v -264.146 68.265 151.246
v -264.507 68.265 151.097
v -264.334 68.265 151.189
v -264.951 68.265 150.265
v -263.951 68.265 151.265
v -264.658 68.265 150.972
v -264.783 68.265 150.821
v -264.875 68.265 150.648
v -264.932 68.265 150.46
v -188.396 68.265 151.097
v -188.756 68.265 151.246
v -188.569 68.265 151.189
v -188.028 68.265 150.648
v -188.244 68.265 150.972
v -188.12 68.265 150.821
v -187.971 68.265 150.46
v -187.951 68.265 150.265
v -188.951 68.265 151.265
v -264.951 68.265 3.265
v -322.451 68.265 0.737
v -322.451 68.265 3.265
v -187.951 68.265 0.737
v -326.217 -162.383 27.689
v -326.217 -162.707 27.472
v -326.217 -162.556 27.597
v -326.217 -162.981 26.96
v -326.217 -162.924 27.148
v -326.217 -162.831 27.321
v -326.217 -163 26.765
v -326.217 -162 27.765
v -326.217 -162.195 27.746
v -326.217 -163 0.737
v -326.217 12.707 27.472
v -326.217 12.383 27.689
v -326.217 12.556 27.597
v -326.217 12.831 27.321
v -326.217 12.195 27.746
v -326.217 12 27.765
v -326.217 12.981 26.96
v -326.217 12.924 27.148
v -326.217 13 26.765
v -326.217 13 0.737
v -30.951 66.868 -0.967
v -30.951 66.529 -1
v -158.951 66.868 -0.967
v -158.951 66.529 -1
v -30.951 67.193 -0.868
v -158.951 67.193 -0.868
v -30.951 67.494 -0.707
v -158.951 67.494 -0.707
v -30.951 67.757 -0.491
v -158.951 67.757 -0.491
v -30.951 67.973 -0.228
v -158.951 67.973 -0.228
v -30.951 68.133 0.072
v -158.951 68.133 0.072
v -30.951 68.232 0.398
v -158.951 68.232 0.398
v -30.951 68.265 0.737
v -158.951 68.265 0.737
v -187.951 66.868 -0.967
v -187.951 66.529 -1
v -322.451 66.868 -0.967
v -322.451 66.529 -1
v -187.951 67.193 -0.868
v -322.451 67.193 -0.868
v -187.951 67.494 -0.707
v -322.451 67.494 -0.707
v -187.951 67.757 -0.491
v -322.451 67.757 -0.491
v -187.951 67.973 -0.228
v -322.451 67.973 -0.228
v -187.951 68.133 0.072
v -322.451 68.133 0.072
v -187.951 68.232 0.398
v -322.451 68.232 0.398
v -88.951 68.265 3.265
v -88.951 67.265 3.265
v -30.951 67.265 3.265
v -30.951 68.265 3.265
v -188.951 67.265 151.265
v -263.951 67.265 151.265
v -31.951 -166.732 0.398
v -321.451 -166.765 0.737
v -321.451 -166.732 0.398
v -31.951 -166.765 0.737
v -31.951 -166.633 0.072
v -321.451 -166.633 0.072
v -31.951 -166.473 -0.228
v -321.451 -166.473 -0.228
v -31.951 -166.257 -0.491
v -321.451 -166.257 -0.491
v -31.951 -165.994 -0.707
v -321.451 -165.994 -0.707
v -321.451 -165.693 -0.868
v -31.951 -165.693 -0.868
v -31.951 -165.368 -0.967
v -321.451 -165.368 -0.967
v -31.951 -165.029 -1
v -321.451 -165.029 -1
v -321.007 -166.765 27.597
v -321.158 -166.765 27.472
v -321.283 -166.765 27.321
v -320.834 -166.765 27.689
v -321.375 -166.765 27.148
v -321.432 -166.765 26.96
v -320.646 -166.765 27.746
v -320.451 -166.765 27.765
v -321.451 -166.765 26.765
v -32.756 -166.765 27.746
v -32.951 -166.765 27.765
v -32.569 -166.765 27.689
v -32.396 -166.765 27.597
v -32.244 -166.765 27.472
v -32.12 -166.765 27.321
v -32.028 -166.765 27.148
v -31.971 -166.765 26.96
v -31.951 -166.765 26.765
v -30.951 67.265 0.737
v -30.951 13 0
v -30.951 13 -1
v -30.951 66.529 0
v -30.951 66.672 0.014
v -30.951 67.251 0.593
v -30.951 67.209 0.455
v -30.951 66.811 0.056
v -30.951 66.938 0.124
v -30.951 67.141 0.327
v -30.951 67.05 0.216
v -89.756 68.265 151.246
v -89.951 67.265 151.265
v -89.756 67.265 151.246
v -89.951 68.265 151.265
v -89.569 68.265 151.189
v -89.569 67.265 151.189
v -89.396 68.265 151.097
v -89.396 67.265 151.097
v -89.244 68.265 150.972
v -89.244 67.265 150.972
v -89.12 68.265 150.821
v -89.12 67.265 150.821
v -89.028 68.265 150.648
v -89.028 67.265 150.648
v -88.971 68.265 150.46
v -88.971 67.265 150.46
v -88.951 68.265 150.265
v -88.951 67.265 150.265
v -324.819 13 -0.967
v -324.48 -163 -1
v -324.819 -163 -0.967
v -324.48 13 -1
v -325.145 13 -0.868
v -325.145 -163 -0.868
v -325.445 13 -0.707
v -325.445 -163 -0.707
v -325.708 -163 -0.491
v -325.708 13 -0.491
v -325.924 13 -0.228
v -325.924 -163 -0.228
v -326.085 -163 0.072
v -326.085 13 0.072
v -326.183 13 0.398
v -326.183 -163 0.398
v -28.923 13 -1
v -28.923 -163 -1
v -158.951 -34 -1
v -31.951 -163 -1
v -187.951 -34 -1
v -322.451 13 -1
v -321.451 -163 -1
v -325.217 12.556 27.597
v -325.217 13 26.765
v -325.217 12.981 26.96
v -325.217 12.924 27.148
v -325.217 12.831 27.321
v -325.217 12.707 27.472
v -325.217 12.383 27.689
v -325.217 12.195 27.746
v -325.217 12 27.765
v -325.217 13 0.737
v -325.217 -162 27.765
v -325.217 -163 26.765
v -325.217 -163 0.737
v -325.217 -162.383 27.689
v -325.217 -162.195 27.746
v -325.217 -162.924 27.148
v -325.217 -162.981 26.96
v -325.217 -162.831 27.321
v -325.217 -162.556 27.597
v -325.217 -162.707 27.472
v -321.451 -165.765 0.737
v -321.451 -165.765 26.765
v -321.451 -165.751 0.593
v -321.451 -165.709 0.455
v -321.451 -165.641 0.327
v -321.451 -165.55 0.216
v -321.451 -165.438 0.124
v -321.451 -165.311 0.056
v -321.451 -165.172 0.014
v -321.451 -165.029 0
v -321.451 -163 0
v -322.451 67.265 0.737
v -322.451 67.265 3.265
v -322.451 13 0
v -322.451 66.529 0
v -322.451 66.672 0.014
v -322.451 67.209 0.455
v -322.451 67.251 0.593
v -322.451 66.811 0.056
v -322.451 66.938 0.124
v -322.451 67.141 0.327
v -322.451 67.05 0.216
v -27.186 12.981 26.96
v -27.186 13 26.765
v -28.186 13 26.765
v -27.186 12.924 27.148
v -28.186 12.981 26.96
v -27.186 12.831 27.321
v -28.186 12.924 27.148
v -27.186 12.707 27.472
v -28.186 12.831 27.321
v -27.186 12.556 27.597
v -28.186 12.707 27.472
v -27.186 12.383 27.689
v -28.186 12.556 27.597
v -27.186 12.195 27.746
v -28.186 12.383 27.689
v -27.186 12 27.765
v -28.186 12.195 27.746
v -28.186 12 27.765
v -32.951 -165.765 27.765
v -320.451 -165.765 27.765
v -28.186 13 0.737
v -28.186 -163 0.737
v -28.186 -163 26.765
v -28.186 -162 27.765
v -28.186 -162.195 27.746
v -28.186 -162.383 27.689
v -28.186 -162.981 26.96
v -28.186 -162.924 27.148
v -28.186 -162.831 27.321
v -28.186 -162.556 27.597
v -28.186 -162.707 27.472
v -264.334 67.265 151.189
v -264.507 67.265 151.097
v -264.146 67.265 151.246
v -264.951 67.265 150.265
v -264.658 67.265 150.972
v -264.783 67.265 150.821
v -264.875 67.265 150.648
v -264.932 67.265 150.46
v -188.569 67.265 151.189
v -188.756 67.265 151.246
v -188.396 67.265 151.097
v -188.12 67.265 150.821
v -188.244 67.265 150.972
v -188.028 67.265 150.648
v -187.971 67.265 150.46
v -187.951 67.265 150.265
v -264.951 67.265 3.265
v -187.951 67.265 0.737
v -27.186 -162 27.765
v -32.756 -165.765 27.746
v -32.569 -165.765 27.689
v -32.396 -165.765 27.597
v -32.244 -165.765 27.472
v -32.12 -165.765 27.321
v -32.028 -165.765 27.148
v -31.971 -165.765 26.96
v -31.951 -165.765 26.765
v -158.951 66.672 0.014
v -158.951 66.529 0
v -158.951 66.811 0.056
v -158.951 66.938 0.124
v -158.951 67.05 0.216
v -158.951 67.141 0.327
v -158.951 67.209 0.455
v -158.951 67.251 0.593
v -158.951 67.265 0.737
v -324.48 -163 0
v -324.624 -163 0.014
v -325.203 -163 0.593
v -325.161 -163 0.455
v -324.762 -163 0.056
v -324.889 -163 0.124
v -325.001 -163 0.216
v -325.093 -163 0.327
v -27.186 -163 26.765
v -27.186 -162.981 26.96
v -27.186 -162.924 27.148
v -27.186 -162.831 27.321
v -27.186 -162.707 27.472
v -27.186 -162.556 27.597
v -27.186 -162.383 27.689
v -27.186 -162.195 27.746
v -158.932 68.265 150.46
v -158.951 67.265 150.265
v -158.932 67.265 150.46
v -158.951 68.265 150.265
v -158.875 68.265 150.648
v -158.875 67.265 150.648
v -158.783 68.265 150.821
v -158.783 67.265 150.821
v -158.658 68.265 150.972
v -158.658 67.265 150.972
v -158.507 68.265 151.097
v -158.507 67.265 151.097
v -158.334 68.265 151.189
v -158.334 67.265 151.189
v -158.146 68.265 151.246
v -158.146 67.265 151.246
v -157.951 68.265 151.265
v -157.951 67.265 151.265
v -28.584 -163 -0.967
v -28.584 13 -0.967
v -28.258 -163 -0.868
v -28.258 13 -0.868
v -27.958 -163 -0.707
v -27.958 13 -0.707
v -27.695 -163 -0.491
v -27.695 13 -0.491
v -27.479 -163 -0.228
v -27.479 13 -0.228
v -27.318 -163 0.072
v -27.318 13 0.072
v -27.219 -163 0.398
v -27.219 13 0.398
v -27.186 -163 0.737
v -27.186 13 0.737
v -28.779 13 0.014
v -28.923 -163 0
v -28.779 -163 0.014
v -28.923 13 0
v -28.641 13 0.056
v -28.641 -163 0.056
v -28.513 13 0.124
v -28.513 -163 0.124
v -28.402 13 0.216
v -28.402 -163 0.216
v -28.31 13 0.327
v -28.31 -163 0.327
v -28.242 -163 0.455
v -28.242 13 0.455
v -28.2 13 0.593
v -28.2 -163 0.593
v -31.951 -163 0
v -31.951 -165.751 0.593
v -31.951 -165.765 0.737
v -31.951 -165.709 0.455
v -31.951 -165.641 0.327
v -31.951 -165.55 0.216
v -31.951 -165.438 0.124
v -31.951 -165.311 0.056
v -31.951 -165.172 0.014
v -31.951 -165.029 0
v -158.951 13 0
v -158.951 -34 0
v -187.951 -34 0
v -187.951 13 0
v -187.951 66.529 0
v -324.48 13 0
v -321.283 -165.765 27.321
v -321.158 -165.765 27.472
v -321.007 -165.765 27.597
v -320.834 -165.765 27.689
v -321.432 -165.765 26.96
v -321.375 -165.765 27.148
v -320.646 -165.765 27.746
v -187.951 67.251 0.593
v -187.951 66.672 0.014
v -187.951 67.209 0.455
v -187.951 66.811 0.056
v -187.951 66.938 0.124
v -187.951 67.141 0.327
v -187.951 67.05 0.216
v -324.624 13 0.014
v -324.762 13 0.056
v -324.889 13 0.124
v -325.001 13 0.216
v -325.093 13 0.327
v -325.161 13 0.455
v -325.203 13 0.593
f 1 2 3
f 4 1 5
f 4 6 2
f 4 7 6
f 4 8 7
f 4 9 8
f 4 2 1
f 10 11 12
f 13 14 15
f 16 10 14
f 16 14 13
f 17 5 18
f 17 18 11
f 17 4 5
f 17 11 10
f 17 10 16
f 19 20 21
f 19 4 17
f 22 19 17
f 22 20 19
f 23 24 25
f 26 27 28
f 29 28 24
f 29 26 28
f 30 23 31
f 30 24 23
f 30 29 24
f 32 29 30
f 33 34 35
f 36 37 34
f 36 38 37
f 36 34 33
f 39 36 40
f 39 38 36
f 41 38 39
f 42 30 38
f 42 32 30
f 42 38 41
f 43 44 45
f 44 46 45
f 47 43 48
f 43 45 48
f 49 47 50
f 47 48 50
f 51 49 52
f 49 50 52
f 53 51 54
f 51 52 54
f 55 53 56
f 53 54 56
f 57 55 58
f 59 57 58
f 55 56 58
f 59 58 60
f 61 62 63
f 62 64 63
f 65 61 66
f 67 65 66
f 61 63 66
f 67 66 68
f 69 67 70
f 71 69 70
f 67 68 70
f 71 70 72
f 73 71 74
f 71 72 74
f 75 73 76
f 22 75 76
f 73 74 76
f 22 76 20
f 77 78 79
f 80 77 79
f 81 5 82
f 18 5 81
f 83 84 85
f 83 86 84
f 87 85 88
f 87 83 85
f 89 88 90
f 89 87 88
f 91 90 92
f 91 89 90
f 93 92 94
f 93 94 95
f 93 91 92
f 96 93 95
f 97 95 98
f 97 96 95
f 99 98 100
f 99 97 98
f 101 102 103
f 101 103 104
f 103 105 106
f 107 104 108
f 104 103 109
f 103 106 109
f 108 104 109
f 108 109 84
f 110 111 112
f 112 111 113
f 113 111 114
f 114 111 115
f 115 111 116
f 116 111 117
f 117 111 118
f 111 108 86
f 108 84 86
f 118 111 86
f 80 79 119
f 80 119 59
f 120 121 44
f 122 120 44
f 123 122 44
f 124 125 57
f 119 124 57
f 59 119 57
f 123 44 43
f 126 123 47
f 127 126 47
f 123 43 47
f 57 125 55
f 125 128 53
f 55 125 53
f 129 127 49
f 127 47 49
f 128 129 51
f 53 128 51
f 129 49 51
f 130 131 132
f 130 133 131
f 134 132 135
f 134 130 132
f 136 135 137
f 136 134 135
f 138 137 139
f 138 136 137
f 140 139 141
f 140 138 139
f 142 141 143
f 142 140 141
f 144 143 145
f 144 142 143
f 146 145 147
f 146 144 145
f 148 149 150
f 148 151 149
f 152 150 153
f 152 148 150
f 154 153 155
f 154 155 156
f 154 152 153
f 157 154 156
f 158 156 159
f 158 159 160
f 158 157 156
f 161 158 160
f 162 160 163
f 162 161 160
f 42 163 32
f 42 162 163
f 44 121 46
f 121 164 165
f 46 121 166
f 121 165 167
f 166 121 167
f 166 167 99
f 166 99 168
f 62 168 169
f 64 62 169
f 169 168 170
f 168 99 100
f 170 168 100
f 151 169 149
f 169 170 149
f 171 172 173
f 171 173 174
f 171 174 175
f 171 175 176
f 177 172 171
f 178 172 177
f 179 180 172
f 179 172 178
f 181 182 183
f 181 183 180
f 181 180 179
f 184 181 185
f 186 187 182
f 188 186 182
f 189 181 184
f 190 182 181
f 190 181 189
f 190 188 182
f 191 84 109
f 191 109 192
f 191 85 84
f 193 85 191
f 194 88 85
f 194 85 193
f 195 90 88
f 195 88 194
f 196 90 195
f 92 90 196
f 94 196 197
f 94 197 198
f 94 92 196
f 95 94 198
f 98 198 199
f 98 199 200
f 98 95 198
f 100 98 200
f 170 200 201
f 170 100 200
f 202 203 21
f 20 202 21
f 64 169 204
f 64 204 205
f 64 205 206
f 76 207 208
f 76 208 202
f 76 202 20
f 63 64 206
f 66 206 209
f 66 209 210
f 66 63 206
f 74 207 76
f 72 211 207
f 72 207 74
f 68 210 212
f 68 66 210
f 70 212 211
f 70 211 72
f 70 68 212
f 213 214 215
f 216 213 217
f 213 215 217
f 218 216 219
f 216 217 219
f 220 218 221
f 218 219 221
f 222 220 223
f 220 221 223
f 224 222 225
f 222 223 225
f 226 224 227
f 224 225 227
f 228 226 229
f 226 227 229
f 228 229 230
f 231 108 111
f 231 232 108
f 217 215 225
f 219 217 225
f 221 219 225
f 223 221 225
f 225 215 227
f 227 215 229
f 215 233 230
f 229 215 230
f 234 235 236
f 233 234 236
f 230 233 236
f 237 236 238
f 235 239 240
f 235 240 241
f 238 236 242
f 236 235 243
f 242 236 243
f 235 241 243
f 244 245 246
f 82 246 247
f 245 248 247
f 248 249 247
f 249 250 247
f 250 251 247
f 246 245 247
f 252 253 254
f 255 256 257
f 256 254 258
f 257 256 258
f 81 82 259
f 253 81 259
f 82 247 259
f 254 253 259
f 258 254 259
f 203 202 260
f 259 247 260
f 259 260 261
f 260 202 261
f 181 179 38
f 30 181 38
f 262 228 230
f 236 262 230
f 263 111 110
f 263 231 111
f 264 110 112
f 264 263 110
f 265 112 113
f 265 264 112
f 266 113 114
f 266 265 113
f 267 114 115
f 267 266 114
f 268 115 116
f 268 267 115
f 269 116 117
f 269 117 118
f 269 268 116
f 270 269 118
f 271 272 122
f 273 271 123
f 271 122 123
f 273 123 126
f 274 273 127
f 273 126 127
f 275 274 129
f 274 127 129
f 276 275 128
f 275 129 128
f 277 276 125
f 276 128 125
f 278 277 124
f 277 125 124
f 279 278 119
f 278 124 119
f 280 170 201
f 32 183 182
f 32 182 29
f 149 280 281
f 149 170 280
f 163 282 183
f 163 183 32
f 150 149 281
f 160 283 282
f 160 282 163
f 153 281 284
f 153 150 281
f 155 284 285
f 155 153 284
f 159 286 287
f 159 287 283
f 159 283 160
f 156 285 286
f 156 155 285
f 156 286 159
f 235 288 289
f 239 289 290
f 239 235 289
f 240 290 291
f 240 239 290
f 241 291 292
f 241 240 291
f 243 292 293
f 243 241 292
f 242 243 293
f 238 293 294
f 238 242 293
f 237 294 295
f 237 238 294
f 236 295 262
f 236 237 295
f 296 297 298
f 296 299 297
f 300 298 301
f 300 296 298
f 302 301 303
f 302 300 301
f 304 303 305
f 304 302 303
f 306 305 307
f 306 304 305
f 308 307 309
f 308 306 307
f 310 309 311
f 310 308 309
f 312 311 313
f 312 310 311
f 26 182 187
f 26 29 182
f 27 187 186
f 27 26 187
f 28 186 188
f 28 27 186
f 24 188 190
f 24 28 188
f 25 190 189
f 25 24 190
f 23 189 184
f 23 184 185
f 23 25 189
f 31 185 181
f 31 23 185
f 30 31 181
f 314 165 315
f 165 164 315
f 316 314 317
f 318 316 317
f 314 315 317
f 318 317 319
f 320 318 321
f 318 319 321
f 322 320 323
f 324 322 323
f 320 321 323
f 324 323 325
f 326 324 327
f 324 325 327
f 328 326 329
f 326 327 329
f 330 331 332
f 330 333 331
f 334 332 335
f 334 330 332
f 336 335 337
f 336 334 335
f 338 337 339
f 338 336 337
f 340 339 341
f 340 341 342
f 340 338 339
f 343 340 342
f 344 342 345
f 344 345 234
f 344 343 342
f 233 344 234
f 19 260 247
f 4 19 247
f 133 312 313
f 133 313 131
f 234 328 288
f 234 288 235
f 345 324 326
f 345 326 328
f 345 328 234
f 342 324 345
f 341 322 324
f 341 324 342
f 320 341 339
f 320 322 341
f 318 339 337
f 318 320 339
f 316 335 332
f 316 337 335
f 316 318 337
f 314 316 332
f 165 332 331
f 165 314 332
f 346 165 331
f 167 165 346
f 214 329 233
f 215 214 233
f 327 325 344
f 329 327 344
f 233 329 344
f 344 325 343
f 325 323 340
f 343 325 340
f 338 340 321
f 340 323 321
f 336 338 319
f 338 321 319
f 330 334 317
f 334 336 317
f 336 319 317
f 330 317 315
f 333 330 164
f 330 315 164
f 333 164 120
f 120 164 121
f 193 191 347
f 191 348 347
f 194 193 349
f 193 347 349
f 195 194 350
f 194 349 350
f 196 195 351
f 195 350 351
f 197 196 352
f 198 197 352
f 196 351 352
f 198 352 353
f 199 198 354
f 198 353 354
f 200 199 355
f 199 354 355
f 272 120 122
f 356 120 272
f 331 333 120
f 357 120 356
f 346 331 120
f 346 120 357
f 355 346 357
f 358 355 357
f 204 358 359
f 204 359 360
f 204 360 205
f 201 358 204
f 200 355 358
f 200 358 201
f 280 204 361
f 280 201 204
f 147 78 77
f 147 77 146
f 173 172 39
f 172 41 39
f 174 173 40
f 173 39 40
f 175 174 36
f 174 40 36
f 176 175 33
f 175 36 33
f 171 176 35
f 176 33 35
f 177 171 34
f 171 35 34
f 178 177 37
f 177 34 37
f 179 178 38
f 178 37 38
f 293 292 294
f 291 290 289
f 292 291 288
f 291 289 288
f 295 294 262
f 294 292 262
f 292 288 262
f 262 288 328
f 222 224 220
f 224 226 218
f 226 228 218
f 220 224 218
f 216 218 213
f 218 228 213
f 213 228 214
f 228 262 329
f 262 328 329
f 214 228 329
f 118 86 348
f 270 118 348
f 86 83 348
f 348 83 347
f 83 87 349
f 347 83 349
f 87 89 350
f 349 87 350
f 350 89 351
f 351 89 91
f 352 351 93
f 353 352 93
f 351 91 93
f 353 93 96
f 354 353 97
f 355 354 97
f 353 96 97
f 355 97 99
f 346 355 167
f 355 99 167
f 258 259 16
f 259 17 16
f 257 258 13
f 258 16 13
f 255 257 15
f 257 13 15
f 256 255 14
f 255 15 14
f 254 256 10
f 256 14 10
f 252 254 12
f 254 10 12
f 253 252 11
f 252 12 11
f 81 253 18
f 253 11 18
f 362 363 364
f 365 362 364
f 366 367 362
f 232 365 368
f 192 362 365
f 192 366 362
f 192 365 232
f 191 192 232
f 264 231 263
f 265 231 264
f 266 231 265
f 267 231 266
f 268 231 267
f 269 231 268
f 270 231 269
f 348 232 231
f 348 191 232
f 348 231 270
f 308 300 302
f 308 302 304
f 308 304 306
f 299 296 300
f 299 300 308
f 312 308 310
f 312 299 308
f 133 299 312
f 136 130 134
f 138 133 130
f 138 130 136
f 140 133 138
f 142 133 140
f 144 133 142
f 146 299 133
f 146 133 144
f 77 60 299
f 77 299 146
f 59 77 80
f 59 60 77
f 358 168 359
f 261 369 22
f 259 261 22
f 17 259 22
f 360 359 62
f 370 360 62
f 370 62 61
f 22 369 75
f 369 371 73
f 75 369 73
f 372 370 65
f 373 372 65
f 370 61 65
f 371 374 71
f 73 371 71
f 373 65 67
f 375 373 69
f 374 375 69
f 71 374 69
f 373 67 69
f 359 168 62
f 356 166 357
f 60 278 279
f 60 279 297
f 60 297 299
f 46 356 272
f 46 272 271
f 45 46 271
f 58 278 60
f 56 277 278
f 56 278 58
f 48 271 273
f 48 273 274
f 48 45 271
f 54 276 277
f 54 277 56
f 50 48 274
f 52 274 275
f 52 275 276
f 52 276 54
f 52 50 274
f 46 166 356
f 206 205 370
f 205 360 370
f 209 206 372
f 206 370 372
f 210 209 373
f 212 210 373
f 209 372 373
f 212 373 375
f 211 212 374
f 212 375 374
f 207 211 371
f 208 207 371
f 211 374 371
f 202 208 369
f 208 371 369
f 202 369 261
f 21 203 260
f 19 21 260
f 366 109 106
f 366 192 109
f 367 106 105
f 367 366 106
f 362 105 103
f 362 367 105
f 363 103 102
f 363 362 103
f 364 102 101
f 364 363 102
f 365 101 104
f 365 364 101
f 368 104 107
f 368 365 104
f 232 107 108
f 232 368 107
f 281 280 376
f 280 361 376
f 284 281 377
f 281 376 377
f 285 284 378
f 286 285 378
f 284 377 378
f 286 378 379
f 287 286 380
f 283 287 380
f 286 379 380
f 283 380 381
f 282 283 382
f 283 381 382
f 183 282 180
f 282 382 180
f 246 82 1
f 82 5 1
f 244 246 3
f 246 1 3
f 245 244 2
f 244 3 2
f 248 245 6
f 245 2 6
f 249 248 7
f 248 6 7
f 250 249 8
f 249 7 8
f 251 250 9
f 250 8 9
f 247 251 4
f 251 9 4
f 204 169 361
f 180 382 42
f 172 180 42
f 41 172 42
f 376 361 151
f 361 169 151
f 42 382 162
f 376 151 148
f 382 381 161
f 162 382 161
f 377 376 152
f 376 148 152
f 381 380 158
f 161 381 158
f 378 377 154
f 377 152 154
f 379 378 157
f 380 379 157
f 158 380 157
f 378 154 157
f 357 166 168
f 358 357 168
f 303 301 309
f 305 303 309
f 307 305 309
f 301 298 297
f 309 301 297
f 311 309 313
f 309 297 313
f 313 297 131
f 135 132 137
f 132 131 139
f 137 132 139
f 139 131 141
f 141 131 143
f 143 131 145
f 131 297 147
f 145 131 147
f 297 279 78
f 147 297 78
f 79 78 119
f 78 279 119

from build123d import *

# Parameters (mm, degrees)
SKETCH1_W           = 299.030753262
SKETCH1_H           = 176
BOSS_EXTRUDE1_DEPTH = 28.765376631
SKETCH2_W           = 297.030753262
SKETCH2_H           = 27.765376631
CUT_EXTRUDE1_DEPTH  = 372.704572948
SKETCH3_W           = 29
SKETCH3_H           = 47
CUT_EXTRUDE2_DEPTH  = 366.805713875
SKETCH4_W           = 134.5
SKETCH4_H           = 1
BOSS_EXTRUDE2_DEPTH = 55.265376631
SKETCH5_W           = 134.5
SKETCH5_H           = 1
BOSS_EXTRUDE3_DEPTH = 151.265376631
SKETCH6_W           = 128
SKETCH6_H           = 1
BOSS_EXTRUDE4_DEPTH = 55.265376631
SKETCH7_W           = 128
SKETCH7_H           = 1
BOSS_EXTRUDE5_DEPTH = 151.265376631
SKETCH8_W           = 289.5
SKETCH8_H           = 1
BOSS_EXTRUDE6_DEPTH = 3.765376631
SKETCH9_W           = 289.5
SKETCH9_H           = 1
BOSS_EXTRUDE7_DEPTH = 27.765376631
SKETCH10_W          = 57.5
SKETCH10_H          = 148
CUT_EXTRUDE3_DEPTH  = 430.032610708
SKETCH11_W          = 58
SKETCH11_H          = 148
CUT_EXTRUDE4_DEPTH  = 430.032610708
FILLET1_R           = 0.7366
FILLET2_R           = 1
FILLET3_R           = 1.7366


with BuildPart() as part:
    # Sketch1 → Boss-Extrude1 (new body)
    with BuildSketch(Plane(origin=(0, 0, -1), x_dir=(-1, 0, 0), z_dir=(0, 0, -1))):
        with Locations((176.701381692, -75)):
            Rectangle(SKETCH1_W, SKETCH1_H)
    extrude(amount=-BOSS_EXTRUDE1_DEPTH)

    # Sketch2 → Cut-Extrude1 (cut, through all)
    with BuildSketch(Plane.XZ.offset(163)):
        with Locations((-176.701381692, 13.882688316)):
            Rectangle(SKETCH2_W, SKETCH2_H)
    extrude(amount=-CUT_EXTRUDE1_DEPTH, mode=Mode.SUBTRACT)

    # Sketch3 → Cut-Extrude2 (cut, through all)
    with BuildSketch(Plane(origin=(0, 0, -1), x_dir=(-1, 0, 0), z_dir=(0, 0, -1))):
        with Locations((173.451381692, -10.5)):
            Rectangle(SKETCH3_W, SKETCH3_H)
    extrude(amount=-CUT_EXTRUDE2_DEPTH, mode=Mode.SUBTRACT)

    # Sketch4 → Boss-Extrude2 (add)
    with BuildSketch(Plane(origin=(0, 13, 0), x_dir=(-1, 0, 0), z_dir=(0, 1, 0))):
        with Locations((255.201381692, -0.5)):
            Rectangle(SKETCH4_W, SKETCH4_H)
    extrude(amount=BOSS_EXTRUDE2_DEPTH)

    # Sketch5 → Boss-Extrude3 (add)
    with BuildSketch(Plane.XY):
        with Locations((-255.201381692, 67.765376631)):
            Rectangle(SKETCH5_W, SKETCH5_H)
    extrude(amount=BOSS_EXTRUDE3_DEPTH)

    # Sketch6 → Boss-Extrude4 (add)
    with BuildSketch(Plane(origin=(0, 13, 0), x_dir=(-1, 0, 0), z_dir=(0, 1, 0))):
        with Locations((94.951381692, -0.5)):
            Rectangle(SKETCH6_W, SKETCH6_H)
    extrude(amount=BOSS_EXTRUDE4_DEPTH)

    # Sketch7 → Boss-Extrude5 (add)
    with BuildSketch(Plane.XY):
        with Locations((-94.951381692, 67.765376631)):
            Rectangle(SKETCH7_W, SKETCH7_H)
    extrude(amount=BOSS_EXTRUDE5_DEPTH)

    # Sketch8 → Boss-Extrude6 (add)
    with BuildSketch(Plane.XZ.offset(163)):
        with Locations((-176.701381692, -0.5)):
            Rectangle(SKETCH8_W, SKETCH8_H)
    extrude(amount=BOSS_EXTRUDE6_DEPTH)

    # Sketch9 → Boss-Extrude7 (add)
    with BuildSketch(Plane.XY):
        with Locations((-176.701381692, -166.265376631)):
            Rectangle(SKETCH9_W, SKETCH9_H)
    extrude(amount=BOSS_EXTRUDE7_DEPTH)

    # Sketch10 → Cut-Extrude3 (cut, through all)
    with BuildSketch(Plane.XZ.offset(-67.265376631)):
        with Locations((-293.701381692, 77.265376631)):
            Rectangle(SKETCH10_W, SKETCH10_H)
    extrude(amount=-CUT_EXTRUDE3_DEPTH, mode=Mode.SUBTRACT)

    # Sketch11 → Cut-Extrude4 (cut, through all)
    with BuildSketch(Plane.XZ.offset(-67.265376631)):
        with Locations((-59.951381692, 77.265376631)):
            Rectangle(SKETCH11_W, SKETCH11_H)
    extrude(amount=-CUT_EXTRUDE4_DEPTH, mode=Mode.SUBTRACT)

    # Fillet1
    fillet1_edges = [part.edges().sort_by_distance(p)[0] for p in [
        (-176.701381692, -165.765376631, 0),
        (-28.186005061, -75, 0),
        (-325.216758323, -75, 0),
        (-255.201381692, 67.265376631, 0),
        (-94.951381692, 67.265376631, 0),
    ]]
    fillet(fillet1_edges, radius=FILLET1_R)

    # Fillet2
    fillet2_edges = [part.edges().sort_by_distance(p)[0] for p in [
        (-325.716758323, 13, 27.765376631),
        (-321.451381692, -166.265376631, 27.765376631),
        (-31.951381692, -166.265376631, 27.765376631),
        (-264.951381692, 67.765376631, 151.265376631),
        (-325.716758323, -163, 27.765376631),
        (-27.686005061, 13, 27.765376631),
        (-88.951381692, 67.765376631, 151.265376631),
        (-27.686005061, -163, 27.765376631),
        (-187.951381692, 67.765376631, 151.265376631),
        (-158.951381692, 67.765376631, 151.265376631),
    ]]
    fillet(fillet2_edges, radius=FILLET2_R)

    # Fillet3
    fillet3_edges = [part.edges().sort_by_distance(p)[0] for p in [
        (-176.701381692, -166.765376631, -1),
        (-27.186005061, -75, -1),
        (-255.201381692, 68.265376631, -1),
        (-326.216758323, -75, -1),
        (-94.951381692, 68.265376631, -1),
    ]]
    fillet(fillet3_edges, radius=FILLET3_R)


solid = part.part
